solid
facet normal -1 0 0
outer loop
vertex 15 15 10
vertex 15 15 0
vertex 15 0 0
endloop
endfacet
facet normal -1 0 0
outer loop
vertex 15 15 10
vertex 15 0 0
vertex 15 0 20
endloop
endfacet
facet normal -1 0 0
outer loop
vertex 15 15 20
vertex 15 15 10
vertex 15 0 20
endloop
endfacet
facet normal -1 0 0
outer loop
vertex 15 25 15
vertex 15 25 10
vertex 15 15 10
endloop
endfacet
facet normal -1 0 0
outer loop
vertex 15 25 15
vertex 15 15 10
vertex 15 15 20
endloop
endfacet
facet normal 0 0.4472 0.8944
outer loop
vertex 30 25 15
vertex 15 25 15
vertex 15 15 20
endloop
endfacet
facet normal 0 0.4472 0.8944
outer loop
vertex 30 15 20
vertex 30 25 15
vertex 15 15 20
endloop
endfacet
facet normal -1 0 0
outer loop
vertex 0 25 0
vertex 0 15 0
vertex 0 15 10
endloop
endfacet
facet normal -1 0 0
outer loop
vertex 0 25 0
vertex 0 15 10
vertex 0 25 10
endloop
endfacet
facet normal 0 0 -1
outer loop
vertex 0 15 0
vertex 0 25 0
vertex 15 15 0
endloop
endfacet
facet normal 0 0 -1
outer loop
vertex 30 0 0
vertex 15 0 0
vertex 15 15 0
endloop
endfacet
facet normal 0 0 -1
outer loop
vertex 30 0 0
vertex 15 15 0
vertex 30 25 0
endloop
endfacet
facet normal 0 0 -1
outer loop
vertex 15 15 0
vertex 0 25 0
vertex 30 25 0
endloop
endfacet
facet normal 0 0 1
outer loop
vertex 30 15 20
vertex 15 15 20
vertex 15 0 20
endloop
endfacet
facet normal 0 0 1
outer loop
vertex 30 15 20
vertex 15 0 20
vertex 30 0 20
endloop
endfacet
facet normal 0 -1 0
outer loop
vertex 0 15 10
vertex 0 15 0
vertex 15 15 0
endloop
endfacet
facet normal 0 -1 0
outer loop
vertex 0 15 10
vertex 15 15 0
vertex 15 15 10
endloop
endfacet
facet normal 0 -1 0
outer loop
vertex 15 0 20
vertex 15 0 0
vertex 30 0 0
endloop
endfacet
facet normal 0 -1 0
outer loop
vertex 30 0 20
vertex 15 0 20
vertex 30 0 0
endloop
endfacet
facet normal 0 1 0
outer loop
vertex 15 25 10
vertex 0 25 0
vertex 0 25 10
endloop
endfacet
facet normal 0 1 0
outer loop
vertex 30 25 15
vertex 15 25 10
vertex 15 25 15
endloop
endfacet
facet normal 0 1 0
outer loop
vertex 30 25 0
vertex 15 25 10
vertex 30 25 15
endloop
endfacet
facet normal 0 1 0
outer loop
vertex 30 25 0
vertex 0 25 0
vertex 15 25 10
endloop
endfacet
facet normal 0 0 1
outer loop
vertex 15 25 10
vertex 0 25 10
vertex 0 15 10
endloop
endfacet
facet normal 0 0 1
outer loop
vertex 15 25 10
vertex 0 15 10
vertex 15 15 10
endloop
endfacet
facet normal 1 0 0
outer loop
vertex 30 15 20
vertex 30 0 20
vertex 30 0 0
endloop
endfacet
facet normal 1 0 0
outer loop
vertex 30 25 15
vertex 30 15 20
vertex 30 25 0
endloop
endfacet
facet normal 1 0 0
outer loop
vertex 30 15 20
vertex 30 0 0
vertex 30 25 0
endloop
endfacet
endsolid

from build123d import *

# Parameters (mm, degrees)
SKETCH1_W           = 30
SKETCH1_H           = 25
BOSS_EXTRUDE1_DEPTH = 20
SKETCH2_W           = 15
SKETCH2_H           = 25
CUT_EXTRUDE1_DEPTH  = 10
CUT_EXTRUDE2_DEPTH  = 20
SKETCH4_W           = 10
SKETCH4_H           = 15
CUT_EXTRUDE3_DEPTH  = 15


with BuildPart() as part:
    # Sketch1 → Boss-Extrude1 (new body)
    with BuildSketch(Plane.XY):
        with Locations((15, 12.5)):
            Rectangle(SKETCH1_W, SKETCH1_H)
    extrude(amount=BOSS_EXTRUDE1_DEPTH)

    # Sketch2 → Cut-Extrude1 (cut)
    with BuildSketch(Plane.XY.offset(20)):
        with Locations((7.5, 12.5)):
            Rectangle(SKETCH2_W, SKETCH2_H)
    extrude(amount=-CUT_EXTRUDE1_DEPTH, mode=Mode.SUBTRACT)

    # Sketch3 → Cut-Extrude2 (cut)
    with BuildSketch(Plane.ZY.offset(-15)):
        Polygon((15, 25), (20, 15), (20, 25), align=None)
    extrude(amount=-CUT_EXTRUDE2_DEPTH, mode=Mode.SUBTRACT)

    # Sketch4 → Cut-Extrude3 (cut)
    with BuildSketch(Plane.ZY):
        with Locations((5, 7.5)):
            Rectangle(SKETCH4_W, SKETCH4_H)
    extrude(amount=-CUT_EXTRUDE3_DEPTH, mode=Mode.SUBTRACT)


solid = part.part
